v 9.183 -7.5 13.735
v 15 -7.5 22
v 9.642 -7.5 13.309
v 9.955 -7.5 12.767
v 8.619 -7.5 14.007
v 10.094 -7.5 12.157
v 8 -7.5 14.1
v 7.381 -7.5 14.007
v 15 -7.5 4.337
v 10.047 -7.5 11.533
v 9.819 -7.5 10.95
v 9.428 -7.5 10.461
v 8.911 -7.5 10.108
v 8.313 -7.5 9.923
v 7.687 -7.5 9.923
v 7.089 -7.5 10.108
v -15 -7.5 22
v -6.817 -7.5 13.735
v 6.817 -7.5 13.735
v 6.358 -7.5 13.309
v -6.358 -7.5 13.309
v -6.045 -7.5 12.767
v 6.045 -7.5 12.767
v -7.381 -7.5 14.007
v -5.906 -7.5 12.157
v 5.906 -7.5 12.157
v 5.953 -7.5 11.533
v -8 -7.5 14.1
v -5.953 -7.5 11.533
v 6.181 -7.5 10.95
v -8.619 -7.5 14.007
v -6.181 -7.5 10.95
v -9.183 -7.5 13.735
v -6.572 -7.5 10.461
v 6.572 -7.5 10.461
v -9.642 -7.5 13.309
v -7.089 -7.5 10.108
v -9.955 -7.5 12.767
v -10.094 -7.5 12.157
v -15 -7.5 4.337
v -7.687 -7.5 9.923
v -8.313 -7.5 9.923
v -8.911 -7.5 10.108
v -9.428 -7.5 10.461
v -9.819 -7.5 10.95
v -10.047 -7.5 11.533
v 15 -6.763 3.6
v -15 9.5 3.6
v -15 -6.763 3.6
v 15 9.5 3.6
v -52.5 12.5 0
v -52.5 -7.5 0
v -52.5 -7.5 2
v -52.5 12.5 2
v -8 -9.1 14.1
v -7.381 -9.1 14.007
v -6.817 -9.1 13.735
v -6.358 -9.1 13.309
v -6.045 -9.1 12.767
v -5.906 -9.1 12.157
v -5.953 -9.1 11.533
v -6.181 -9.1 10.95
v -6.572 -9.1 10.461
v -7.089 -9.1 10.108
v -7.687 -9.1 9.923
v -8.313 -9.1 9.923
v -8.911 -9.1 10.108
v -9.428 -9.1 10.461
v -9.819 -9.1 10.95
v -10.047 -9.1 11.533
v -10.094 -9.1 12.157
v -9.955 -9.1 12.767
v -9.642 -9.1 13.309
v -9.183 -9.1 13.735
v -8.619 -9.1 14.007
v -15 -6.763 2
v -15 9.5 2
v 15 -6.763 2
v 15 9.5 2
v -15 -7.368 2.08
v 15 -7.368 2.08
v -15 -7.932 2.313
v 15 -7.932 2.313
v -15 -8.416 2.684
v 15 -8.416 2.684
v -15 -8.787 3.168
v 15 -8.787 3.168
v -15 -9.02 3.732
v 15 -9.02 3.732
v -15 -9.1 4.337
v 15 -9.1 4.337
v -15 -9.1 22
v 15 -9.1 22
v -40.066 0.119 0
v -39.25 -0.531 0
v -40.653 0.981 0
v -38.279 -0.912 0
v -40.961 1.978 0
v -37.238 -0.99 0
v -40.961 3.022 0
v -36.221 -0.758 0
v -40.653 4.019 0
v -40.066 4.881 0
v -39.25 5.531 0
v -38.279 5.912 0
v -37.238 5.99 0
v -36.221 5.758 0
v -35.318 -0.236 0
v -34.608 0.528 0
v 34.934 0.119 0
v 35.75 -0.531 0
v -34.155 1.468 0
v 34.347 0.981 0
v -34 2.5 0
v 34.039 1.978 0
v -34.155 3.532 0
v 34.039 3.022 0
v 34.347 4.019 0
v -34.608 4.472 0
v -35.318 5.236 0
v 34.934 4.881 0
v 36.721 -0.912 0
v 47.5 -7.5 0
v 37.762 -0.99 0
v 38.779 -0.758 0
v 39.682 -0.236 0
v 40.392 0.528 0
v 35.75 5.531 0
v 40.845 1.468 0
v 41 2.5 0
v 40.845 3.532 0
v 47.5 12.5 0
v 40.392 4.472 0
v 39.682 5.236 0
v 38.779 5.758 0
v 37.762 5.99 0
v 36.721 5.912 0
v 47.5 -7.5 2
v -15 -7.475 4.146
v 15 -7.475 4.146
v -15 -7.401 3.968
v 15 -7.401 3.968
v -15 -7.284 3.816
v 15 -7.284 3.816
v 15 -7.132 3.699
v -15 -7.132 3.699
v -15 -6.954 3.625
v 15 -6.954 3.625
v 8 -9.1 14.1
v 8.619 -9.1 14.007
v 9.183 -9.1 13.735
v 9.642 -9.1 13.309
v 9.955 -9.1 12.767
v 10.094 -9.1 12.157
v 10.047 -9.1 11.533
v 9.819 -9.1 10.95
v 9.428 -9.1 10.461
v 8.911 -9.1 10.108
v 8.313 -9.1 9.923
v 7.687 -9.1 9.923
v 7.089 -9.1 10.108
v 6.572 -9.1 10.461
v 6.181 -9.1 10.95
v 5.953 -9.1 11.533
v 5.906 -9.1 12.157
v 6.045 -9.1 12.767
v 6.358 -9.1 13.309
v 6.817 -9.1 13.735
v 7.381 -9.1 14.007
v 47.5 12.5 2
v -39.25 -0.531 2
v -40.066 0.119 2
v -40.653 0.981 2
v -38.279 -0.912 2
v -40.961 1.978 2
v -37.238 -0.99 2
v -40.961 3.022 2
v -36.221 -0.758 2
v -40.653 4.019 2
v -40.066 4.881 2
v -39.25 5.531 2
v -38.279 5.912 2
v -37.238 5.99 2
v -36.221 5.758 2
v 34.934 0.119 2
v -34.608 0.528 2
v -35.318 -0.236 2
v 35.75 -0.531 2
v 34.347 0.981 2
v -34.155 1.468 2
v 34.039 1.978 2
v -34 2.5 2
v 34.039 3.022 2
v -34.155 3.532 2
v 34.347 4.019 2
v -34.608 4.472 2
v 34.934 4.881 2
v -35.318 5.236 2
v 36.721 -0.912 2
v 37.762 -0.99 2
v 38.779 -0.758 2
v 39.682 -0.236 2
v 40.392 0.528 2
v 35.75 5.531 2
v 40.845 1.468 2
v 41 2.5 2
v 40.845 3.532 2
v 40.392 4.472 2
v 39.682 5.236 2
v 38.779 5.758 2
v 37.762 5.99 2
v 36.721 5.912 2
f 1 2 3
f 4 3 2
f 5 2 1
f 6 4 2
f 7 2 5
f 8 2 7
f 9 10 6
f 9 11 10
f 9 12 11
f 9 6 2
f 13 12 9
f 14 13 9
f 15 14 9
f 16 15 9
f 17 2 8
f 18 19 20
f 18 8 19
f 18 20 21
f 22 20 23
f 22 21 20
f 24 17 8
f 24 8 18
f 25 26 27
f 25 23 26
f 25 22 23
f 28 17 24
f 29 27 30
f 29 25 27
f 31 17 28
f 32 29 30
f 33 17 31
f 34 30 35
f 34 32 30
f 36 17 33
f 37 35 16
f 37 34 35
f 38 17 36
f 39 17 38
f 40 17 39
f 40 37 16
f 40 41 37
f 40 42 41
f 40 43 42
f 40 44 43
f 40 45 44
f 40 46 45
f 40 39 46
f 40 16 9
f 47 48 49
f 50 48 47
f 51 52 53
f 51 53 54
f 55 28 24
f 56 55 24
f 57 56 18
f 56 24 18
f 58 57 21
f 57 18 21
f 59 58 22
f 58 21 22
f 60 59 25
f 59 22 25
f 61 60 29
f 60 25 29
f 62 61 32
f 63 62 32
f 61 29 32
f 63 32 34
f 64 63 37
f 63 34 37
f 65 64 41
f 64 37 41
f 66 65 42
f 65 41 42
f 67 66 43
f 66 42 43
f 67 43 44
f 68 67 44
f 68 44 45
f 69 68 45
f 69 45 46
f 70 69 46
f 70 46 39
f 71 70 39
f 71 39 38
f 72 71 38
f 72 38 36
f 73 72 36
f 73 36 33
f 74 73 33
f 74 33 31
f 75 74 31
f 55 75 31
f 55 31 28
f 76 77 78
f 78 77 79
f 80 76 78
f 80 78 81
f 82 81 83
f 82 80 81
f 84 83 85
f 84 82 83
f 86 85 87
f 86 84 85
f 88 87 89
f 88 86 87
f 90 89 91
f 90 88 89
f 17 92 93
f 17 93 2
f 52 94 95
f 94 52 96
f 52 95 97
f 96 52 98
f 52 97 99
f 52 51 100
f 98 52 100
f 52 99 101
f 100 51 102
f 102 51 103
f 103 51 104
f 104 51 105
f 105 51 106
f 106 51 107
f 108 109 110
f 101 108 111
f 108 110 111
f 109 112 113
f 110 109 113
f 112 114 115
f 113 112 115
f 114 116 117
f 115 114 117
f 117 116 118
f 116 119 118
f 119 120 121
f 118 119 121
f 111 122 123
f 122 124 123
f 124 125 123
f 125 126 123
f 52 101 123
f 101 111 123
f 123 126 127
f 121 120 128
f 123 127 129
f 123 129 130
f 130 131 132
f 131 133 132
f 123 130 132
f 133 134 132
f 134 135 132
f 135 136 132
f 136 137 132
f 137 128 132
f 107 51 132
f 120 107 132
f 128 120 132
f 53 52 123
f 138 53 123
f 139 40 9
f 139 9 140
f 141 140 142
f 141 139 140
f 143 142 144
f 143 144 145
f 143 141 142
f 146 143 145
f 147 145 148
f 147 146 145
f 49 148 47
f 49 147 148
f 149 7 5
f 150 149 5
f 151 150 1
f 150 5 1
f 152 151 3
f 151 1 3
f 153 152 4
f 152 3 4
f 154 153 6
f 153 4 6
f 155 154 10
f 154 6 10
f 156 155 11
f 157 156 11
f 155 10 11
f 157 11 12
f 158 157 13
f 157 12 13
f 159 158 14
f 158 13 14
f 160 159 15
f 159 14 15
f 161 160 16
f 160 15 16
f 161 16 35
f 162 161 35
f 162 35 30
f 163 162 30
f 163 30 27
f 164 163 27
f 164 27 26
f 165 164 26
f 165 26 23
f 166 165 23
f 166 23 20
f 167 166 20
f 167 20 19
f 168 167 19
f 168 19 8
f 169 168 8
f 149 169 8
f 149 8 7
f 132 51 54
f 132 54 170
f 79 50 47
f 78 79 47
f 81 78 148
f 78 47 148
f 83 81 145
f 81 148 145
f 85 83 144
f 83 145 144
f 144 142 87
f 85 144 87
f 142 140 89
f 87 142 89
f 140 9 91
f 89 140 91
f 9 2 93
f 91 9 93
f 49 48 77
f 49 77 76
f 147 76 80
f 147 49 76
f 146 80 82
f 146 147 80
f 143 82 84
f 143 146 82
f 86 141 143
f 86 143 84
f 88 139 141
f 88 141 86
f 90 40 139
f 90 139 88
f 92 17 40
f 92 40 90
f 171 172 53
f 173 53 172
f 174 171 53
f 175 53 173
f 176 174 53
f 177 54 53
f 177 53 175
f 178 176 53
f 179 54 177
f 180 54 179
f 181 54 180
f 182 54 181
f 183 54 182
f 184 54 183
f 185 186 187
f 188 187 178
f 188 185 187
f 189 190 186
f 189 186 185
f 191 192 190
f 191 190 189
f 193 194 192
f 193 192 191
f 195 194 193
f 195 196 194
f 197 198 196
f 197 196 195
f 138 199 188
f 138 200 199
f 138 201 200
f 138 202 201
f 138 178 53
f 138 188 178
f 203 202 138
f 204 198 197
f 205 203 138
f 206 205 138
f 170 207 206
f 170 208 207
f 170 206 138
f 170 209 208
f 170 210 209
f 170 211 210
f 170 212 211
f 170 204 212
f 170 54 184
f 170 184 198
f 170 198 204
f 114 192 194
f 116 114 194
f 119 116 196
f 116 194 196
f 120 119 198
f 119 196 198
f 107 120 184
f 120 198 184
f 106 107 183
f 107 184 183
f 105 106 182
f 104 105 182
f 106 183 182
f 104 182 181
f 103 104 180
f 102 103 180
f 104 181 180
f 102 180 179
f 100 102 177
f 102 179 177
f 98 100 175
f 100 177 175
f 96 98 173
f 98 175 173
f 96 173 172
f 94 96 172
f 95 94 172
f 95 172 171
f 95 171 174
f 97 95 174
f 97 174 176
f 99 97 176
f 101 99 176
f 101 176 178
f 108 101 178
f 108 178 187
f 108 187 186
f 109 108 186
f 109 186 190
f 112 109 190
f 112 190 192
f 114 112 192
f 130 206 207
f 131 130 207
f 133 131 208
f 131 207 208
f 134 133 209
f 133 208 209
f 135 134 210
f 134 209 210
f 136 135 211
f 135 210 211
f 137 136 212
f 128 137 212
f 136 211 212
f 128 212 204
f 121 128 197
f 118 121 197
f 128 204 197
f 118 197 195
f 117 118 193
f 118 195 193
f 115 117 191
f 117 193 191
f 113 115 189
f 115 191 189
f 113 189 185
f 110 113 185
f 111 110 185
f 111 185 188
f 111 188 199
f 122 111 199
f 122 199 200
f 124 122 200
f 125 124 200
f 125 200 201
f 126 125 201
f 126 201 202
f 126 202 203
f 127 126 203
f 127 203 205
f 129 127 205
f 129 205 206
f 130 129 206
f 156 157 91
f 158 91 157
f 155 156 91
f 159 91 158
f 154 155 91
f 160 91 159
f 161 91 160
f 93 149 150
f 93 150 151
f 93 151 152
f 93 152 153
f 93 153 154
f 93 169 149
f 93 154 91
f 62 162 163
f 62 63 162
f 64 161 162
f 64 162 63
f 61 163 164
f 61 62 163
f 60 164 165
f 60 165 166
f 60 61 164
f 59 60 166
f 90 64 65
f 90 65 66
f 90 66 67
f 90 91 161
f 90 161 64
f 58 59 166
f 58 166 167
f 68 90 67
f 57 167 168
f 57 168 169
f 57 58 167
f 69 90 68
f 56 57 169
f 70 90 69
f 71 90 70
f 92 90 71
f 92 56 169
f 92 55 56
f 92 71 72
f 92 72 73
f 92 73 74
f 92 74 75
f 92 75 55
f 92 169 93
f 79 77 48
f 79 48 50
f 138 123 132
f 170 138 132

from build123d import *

# Parameters (mm, degrees)
SKETCH_1_W                       = 100
SKETCH_1_H                       = 20
EXTRUDE_1_DEPTH                  = 2
SKETCH_2_W                       = 30
SKETCH_2_H                       = 17
SM_BASE_FLANGE_1_DEPTH           = 1.6
SKETCH_11_R                      = 3.5
CUT_EXTRUDE_2_DEPTH              = 55.004629431
SM_EDGE_FLANGE_1_STRIP_W         = 7.8732
SM_EDGE_FLANGE_1_STRIP_H         = 1.6
SM_EDGE_FLANGE_1_STRIP_CUT_DEPTH = 30
SM_EDGE_FLANGE_1_DEPTH           = 30
SKETCH_15_R                      = 2.1
CUT_EXTRUDE_3_DEPTH              = 10


# Sheet-metal steps are written as plain solids
with BuildPart() as part:
    # Sketch 1 → 凸台-拉伸1 (new body)
    with BuildSketch(Plane.XY):
        with Locations((-2.5, 2.5)):
            Rectangle(SKETCH_1_W, SKETCH_1_H)
    extrude(amount=EXTRUDE_1_DEPTH)

    # 草图11 → 切除-拉伸2 (cut, through all)
    with BuildSketch(Plane.XY.offset(2)):
        with Locations((-37.5, 2.5)):
            Circle(SKETCH_11_R)
        with Locations((37.5, 2.5)):
            Circle(SKETCH_11_R)
    extrude(amount=-CUT_EXTRUDE_2_DEPTH, mode=Mode.SUBTRACT)


with BuildPart() as body_2:
    # 草图2 → 基体-法兰1 (new body)
    with BuildSketch(Plane.XY.offset(2)):
        with Locations((0, 1)):
            Rectangle(SKETCH_2_W, SKETCH_2_H)
    extrude(amount=SM_BASE_FLANGE_1_DEPTH)

    # 边线-法兰1 strip (across the edge) → 边线-法兰1 strip cut (cut)
    with BuildSketch(Plane(origin=(-15, -7.5, 3.6), x_dir=(0, 1, 0), z_dir=(1, 0, 0))):
        with Locations((-3.2, -0.8)):
            Rectangle(SM_EDGE_FLANGE_1_STRIP_W, SM_EDGE_FLANGE_1_STRIP_H)
    extrude(amount=SM_EDGE_FLANGE_1_STRIP_CUT_DEPTH, mode=Mode.SUBTRACT)

    # 边线-法兰1 section (across the edge) → 边线-法兰1 (add)
    with BuildSketch(Plane(origin=(-15, -7.5, 3.6), x_dir=(0, 1, 0), z_dir=(1, 0, 0))):
        with BuildLine():
            Line((-1.6, 0.7366), (-1.6, 18.4))
            Line((-1.6, 18.4), (0, 18.4))
            Line((0, 18.4), (0, 0.7366))
            ThreePointArc((0, 0.7366), (0.215745145, 0.215745145), (0.7366, 0))
            Line((0.7366, 0), (0.7366, -1.6))
            ThreePointArc((0.7366, -1.6), (-0.915625705, -0.915625705), (-1.6, 0.7366))
        make_face()
    extrude(amount=SM_EDGE_FLANGE_1_DEPTH)

    # 草图15 → 切除-拉伸3 (cut)
    with BuildSketch(Plane(origin=(0, -7.5, 0), x_dir=(1, 0, 0), z_dir=(0, 1, 0))):
        with Locations(Location((-8, -12, 0), (0, 0, 270))):
            Circle(SKETCH_15_R)
        with Locations(Location((8, -12, 0), (0, 0, 270))):
            Circle(SKETCH_15_R)
    extrude(amount=-CUT_EXTRUDE_3_DEPTH, mode=Mode.SUBTRACT)


solid = Compound([part.part, body_2.part])
